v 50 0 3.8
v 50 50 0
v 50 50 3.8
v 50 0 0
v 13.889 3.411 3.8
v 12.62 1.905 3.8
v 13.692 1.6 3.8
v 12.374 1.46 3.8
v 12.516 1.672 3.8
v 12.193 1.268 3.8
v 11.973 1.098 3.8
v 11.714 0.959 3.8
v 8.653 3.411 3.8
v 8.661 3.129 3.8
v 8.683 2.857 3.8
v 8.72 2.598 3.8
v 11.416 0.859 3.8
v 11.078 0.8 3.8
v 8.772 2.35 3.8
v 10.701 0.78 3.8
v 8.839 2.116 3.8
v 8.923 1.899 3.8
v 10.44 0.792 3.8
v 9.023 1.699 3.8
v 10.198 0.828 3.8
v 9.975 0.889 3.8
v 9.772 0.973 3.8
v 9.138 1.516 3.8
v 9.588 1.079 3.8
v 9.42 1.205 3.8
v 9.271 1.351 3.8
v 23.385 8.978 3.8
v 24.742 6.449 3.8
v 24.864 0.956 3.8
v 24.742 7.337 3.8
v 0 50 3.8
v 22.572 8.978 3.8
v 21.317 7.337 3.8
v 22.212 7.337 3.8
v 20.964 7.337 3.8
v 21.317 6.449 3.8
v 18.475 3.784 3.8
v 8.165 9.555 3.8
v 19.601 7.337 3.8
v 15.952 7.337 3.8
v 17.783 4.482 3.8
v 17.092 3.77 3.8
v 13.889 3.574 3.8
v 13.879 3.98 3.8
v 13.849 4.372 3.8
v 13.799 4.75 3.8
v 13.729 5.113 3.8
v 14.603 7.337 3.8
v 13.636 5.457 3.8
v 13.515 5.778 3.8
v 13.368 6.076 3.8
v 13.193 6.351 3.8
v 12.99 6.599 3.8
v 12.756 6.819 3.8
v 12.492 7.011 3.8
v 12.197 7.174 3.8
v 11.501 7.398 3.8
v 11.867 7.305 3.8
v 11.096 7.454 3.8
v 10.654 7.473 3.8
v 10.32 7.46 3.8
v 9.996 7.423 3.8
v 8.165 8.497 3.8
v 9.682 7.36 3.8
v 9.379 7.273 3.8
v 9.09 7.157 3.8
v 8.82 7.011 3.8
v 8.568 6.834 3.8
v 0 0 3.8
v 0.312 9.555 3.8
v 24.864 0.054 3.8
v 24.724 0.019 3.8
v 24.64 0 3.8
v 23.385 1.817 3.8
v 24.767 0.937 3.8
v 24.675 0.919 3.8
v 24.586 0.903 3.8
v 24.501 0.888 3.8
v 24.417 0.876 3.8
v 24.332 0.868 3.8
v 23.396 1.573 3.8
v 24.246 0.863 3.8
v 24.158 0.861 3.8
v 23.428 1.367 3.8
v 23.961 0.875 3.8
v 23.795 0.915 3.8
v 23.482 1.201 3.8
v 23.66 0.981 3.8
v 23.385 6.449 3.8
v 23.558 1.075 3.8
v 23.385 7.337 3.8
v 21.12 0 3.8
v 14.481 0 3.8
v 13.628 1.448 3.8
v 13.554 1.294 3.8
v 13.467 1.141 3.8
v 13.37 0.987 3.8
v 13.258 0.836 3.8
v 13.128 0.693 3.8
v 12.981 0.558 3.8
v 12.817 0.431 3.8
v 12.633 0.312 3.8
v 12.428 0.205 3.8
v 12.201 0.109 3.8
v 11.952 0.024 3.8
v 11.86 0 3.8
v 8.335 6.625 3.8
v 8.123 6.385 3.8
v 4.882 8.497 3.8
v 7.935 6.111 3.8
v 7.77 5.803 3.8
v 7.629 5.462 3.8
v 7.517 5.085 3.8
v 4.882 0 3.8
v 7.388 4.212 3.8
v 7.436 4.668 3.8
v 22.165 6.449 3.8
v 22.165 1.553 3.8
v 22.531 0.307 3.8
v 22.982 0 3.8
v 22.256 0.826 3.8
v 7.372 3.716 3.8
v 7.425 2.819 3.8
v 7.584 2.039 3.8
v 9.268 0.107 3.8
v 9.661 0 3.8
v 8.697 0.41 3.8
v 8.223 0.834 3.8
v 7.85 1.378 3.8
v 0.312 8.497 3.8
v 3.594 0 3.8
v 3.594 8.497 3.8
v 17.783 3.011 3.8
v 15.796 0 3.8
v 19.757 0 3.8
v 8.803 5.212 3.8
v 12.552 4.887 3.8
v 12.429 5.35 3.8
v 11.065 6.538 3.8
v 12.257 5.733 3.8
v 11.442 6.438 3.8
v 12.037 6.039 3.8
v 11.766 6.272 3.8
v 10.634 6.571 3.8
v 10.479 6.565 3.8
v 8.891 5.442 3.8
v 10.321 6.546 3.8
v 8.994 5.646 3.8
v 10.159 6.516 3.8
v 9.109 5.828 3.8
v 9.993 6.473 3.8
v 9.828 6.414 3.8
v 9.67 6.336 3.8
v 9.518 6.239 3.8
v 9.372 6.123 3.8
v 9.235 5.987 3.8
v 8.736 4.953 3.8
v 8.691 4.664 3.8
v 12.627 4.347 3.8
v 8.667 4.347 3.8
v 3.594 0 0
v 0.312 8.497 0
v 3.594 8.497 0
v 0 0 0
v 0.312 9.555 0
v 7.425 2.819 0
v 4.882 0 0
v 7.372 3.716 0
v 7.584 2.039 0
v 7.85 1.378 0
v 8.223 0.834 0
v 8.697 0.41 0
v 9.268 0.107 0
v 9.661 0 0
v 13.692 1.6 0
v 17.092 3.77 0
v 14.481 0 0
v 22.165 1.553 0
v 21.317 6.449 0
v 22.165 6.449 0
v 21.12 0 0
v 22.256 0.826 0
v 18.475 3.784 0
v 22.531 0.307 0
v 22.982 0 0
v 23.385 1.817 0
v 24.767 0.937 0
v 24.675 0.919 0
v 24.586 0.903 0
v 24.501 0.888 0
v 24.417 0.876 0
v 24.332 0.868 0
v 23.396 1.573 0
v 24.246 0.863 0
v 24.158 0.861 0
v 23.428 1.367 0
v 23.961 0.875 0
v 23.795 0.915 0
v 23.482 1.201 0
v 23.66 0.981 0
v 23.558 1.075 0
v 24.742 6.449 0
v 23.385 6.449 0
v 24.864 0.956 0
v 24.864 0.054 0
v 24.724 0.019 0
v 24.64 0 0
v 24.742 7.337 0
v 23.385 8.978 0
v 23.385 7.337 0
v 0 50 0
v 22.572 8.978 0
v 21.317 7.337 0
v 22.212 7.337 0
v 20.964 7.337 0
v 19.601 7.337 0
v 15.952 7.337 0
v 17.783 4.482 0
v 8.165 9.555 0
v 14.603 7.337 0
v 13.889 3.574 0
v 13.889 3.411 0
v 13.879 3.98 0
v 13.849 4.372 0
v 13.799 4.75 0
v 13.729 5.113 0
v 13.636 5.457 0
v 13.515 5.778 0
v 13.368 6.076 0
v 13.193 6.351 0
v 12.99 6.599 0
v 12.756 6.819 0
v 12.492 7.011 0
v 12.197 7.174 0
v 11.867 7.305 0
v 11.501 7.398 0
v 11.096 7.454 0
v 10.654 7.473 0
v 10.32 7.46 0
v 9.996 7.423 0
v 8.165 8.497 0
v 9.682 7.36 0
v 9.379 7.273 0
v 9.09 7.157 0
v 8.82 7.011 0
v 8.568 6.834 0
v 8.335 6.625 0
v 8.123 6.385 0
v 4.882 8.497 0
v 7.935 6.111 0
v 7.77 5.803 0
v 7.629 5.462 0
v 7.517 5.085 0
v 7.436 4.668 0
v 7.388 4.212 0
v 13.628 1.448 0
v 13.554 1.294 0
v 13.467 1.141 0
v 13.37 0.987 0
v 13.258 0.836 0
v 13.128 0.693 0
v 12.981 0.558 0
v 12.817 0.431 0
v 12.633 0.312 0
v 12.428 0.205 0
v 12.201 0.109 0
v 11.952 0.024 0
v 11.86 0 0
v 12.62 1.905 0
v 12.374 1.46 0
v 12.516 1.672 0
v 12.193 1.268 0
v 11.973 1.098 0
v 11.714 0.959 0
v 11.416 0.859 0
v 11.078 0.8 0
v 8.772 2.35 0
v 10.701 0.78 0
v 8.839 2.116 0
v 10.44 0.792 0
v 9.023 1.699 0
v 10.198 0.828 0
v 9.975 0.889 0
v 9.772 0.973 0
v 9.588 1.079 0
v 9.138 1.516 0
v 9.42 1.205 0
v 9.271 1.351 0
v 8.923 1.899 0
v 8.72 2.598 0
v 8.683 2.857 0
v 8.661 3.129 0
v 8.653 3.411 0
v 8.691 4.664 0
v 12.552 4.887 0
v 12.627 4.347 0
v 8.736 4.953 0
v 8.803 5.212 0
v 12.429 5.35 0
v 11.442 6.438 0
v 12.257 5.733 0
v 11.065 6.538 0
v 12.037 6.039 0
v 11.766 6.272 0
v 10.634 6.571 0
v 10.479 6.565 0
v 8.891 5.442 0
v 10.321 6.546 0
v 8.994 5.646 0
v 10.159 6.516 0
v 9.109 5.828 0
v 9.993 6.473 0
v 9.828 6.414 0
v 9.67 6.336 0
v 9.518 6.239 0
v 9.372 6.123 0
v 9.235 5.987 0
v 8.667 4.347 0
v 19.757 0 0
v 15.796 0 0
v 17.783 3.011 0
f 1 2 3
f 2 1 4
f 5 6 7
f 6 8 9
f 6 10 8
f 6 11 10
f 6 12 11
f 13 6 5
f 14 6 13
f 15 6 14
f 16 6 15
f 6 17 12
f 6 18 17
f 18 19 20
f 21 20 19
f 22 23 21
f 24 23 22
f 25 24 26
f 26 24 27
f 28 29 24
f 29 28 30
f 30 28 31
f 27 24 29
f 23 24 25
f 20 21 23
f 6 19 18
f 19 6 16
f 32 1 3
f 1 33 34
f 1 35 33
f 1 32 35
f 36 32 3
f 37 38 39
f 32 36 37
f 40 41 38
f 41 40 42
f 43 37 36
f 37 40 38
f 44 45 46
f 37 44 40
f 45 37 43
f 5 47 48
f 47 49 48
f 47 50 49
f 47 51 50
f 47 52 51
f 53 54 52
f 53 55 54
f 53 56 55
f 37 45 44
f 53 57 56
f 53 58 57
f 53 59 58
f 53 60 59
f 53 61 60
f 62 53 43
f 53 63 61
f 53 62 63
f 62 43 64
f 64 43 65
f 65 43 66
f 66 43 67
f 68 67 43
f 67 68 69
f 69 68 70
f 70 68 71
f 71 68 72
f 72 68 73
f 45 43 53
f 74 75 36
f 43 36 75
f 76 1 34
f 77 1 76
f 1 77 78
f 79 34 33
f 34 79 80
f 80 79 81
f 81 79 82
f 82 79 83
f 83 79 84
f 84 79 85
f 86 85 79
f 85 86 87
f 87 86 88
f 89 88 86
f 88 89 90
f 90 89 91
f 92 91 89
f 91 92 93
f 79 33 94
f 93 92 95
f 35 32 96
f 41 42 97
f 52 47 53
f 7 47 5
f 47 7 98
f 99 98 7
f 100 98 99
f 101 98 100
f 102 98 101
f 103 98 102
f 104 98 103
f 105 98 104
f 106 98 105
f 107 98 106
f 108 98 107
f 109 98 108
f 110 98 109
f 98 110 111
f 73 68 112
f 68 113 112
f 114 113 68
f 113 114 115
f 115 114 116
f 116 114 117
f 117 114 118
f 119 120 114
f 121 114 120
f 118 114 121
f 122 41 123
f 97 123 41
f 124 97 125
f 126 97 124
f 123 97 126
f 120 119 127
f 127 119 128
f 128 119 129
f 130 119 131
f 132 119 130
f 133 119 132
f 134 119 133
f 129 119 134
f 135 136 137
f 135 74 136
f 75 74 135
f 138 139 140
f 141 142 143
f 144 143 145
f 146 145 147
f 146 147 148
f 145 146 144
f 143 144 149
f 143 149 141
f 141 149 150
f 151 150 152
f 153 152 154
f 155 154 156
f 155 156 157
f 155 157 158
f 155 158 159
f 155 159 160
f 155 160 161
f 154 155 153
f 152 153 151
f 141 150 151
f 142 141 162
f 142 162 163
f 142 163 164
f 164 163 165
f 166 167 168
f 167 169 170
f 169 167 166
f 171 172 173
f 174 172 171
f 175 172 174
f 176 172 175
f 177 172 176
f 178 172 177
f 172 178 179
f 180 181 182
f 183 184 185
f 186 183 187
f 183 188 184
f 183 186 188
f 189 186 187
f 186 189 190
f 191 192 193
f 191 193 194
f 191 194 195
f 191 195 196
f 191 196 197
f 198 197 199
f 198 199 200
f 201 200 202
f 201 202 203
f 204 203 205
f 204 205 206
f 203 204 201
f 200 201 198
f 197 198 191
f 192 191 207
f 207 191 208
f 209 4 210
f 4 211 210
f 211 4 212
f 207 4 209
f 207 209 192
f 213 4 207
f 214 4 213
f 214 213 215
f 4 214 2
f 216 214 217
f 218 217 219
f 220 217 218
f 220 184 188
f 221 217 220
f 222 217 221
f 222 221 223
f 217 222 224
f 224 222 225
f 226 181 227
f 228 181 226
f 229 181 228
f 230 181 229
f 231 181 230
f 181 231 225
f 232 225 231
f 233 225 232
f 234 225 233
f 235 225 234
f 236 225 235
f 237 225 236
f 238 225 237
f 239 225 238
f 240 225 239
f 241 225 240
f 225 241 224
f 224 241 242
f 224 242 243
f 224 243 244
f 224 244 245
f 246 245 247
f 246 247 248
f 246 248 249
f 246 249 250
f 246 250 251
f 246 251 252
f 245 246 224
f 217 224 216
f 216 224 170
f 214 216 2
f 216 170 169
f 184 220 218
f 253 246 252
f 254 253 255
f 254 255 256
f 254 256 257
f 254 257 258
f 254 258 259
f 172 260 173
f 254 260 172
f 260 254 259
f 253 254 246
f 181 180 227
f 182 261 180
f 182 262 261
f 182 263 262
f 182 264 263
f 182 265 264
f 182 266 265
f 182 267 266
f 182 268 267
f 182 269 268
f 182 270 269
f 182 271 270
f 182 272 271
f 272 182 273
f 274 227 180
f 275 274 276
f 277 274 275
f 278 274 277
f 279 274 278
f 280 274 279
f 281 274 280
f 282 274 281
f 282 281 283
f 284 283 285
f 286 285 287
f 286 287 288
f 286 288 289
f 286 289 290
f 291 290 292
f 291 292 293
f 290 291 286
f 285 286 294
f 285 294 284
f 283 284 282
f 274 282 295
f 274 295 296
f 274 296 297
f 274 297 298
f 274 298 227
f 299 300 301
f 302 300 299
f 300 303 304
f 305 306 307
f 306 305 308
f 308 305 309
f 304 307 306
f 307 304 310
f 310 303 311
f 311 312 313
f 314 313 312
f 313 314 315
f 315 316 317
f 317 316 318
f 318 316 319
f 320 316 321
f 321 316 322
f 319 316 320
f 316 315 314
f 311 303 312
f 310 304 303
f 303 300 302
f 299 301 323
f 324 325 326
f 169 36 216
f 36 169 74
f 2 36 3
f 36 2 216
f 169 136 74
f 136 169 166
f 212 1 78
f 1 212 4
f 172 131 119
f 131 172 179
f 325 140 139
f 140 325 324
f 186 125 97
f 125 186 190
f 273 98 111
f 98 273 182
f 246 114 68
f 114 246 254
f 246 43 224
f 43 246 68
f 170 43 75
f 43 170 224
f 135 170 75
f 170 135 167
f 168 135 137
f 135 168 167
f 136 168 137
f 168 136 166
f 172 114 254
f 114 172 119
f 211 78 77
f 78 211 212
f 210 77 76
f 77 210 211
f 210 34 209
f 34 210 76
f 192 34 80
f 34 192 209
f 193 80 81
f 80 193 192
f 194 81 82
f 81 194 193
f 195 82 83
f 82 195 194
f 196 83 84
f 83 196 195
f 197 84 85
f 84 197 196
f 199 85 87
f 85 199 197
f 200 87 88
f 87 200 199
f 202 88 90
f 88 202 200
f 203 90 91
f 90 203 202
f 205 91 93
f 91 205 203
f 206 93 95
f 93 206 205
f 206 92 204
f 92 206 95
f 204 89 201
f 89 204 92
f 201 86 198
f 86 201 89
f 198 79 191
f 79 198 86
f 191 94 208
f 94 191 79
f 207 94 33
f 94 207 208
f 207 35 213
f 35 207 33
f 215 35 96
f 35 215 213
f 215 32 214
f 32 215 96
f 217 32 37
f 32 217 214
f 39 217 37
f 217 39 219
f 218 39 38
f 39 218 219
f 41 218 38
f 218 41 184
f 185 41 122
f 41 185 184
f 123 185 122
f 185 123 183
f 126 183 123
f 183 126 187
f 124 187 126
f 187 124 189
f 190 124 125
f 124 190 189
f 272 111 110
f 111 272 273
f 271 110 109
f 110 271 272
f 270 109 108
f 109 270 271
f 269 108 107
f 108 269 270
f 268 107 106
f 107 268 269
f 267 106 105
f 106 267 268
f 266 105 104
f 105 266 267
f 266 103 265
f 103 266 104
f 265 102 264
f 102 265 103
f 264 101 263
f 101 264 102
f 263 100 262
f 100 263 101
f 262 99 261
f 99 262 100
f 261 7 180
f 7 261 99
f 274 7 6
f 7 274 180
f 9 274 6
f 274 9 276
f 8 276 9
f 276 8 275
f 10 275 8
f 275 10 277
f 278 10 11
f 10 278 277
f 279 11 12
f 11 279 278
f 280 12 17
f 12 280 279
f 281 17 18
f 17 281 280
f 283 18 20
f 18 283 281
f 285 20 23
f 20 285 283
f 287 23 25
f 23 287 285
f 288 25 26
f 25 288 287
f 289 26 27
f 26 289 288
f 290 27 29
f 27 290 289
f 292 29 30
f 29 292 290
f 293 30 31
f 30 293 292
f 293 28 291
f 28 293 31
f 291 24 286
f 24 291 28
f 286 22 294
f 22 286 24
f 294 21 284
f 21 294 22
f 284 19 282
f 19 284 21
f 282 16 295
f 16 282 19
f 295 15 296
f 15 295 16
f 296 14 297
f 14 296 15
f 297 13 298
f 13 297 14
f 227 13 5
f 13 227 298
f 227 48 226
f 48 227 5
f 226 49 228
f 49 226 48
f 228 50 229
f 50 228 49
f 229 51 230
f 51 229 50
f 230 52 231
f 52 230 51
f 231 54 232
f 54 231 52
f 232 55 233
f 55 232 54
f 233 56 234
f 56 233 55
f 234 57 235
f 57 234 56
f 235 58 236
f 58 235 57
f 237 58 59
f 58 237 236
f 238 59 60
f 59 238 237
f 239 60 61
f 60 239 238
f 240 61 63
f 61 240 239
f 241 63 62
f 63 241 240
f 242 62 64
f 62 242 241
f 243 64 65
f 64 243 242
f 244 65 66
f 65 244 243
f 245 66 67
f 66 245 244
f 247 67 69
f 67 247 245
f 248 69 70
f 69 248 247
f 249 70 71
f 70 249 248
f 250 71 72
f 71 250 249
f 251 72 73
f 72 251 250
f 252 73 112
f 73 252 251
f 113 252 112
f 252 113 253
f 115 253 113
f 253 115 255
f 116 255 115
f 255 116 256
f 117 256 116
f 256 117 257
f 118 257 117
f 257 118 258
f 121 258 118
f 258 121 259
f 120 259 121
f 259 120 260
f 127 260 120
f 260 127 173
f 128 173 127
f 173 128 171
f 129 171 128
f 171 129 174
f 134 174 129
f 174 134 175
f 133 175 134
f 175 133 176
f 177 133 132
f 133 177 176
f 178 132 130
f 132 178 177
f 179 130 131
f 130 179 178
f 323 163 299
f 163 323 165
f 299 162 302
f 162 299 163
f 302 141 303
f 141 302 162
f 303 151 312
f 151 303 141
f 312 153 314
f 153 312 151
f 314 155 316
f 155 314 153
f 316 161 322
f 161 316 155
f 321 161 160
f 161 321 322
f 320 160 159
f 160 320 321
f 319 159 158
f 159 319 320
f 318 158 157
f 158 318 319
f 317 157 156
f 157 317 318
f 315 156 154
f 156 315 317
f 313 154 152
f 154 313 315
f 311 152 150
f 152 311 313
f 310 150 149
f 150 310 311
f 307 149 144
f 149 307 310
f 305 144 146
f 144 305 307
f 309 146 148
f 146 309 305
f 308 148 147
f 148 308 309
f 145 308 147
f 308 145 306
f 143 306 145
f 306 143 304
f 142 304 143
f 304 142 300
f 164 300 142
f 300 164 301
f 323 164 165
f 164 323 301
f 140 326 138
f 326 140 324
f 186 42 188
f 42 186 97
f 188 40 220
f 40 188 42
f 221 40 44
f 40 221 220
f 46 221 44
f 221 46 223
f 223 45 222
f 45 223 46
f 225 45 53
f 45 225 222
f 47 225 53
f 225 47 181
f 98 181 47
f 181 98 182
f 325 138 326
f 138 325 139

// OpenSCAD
//3d Text Example
difference()
{
    cube([50,50,3.8]);
    linear_extrude(4)
    text("Text");
}
